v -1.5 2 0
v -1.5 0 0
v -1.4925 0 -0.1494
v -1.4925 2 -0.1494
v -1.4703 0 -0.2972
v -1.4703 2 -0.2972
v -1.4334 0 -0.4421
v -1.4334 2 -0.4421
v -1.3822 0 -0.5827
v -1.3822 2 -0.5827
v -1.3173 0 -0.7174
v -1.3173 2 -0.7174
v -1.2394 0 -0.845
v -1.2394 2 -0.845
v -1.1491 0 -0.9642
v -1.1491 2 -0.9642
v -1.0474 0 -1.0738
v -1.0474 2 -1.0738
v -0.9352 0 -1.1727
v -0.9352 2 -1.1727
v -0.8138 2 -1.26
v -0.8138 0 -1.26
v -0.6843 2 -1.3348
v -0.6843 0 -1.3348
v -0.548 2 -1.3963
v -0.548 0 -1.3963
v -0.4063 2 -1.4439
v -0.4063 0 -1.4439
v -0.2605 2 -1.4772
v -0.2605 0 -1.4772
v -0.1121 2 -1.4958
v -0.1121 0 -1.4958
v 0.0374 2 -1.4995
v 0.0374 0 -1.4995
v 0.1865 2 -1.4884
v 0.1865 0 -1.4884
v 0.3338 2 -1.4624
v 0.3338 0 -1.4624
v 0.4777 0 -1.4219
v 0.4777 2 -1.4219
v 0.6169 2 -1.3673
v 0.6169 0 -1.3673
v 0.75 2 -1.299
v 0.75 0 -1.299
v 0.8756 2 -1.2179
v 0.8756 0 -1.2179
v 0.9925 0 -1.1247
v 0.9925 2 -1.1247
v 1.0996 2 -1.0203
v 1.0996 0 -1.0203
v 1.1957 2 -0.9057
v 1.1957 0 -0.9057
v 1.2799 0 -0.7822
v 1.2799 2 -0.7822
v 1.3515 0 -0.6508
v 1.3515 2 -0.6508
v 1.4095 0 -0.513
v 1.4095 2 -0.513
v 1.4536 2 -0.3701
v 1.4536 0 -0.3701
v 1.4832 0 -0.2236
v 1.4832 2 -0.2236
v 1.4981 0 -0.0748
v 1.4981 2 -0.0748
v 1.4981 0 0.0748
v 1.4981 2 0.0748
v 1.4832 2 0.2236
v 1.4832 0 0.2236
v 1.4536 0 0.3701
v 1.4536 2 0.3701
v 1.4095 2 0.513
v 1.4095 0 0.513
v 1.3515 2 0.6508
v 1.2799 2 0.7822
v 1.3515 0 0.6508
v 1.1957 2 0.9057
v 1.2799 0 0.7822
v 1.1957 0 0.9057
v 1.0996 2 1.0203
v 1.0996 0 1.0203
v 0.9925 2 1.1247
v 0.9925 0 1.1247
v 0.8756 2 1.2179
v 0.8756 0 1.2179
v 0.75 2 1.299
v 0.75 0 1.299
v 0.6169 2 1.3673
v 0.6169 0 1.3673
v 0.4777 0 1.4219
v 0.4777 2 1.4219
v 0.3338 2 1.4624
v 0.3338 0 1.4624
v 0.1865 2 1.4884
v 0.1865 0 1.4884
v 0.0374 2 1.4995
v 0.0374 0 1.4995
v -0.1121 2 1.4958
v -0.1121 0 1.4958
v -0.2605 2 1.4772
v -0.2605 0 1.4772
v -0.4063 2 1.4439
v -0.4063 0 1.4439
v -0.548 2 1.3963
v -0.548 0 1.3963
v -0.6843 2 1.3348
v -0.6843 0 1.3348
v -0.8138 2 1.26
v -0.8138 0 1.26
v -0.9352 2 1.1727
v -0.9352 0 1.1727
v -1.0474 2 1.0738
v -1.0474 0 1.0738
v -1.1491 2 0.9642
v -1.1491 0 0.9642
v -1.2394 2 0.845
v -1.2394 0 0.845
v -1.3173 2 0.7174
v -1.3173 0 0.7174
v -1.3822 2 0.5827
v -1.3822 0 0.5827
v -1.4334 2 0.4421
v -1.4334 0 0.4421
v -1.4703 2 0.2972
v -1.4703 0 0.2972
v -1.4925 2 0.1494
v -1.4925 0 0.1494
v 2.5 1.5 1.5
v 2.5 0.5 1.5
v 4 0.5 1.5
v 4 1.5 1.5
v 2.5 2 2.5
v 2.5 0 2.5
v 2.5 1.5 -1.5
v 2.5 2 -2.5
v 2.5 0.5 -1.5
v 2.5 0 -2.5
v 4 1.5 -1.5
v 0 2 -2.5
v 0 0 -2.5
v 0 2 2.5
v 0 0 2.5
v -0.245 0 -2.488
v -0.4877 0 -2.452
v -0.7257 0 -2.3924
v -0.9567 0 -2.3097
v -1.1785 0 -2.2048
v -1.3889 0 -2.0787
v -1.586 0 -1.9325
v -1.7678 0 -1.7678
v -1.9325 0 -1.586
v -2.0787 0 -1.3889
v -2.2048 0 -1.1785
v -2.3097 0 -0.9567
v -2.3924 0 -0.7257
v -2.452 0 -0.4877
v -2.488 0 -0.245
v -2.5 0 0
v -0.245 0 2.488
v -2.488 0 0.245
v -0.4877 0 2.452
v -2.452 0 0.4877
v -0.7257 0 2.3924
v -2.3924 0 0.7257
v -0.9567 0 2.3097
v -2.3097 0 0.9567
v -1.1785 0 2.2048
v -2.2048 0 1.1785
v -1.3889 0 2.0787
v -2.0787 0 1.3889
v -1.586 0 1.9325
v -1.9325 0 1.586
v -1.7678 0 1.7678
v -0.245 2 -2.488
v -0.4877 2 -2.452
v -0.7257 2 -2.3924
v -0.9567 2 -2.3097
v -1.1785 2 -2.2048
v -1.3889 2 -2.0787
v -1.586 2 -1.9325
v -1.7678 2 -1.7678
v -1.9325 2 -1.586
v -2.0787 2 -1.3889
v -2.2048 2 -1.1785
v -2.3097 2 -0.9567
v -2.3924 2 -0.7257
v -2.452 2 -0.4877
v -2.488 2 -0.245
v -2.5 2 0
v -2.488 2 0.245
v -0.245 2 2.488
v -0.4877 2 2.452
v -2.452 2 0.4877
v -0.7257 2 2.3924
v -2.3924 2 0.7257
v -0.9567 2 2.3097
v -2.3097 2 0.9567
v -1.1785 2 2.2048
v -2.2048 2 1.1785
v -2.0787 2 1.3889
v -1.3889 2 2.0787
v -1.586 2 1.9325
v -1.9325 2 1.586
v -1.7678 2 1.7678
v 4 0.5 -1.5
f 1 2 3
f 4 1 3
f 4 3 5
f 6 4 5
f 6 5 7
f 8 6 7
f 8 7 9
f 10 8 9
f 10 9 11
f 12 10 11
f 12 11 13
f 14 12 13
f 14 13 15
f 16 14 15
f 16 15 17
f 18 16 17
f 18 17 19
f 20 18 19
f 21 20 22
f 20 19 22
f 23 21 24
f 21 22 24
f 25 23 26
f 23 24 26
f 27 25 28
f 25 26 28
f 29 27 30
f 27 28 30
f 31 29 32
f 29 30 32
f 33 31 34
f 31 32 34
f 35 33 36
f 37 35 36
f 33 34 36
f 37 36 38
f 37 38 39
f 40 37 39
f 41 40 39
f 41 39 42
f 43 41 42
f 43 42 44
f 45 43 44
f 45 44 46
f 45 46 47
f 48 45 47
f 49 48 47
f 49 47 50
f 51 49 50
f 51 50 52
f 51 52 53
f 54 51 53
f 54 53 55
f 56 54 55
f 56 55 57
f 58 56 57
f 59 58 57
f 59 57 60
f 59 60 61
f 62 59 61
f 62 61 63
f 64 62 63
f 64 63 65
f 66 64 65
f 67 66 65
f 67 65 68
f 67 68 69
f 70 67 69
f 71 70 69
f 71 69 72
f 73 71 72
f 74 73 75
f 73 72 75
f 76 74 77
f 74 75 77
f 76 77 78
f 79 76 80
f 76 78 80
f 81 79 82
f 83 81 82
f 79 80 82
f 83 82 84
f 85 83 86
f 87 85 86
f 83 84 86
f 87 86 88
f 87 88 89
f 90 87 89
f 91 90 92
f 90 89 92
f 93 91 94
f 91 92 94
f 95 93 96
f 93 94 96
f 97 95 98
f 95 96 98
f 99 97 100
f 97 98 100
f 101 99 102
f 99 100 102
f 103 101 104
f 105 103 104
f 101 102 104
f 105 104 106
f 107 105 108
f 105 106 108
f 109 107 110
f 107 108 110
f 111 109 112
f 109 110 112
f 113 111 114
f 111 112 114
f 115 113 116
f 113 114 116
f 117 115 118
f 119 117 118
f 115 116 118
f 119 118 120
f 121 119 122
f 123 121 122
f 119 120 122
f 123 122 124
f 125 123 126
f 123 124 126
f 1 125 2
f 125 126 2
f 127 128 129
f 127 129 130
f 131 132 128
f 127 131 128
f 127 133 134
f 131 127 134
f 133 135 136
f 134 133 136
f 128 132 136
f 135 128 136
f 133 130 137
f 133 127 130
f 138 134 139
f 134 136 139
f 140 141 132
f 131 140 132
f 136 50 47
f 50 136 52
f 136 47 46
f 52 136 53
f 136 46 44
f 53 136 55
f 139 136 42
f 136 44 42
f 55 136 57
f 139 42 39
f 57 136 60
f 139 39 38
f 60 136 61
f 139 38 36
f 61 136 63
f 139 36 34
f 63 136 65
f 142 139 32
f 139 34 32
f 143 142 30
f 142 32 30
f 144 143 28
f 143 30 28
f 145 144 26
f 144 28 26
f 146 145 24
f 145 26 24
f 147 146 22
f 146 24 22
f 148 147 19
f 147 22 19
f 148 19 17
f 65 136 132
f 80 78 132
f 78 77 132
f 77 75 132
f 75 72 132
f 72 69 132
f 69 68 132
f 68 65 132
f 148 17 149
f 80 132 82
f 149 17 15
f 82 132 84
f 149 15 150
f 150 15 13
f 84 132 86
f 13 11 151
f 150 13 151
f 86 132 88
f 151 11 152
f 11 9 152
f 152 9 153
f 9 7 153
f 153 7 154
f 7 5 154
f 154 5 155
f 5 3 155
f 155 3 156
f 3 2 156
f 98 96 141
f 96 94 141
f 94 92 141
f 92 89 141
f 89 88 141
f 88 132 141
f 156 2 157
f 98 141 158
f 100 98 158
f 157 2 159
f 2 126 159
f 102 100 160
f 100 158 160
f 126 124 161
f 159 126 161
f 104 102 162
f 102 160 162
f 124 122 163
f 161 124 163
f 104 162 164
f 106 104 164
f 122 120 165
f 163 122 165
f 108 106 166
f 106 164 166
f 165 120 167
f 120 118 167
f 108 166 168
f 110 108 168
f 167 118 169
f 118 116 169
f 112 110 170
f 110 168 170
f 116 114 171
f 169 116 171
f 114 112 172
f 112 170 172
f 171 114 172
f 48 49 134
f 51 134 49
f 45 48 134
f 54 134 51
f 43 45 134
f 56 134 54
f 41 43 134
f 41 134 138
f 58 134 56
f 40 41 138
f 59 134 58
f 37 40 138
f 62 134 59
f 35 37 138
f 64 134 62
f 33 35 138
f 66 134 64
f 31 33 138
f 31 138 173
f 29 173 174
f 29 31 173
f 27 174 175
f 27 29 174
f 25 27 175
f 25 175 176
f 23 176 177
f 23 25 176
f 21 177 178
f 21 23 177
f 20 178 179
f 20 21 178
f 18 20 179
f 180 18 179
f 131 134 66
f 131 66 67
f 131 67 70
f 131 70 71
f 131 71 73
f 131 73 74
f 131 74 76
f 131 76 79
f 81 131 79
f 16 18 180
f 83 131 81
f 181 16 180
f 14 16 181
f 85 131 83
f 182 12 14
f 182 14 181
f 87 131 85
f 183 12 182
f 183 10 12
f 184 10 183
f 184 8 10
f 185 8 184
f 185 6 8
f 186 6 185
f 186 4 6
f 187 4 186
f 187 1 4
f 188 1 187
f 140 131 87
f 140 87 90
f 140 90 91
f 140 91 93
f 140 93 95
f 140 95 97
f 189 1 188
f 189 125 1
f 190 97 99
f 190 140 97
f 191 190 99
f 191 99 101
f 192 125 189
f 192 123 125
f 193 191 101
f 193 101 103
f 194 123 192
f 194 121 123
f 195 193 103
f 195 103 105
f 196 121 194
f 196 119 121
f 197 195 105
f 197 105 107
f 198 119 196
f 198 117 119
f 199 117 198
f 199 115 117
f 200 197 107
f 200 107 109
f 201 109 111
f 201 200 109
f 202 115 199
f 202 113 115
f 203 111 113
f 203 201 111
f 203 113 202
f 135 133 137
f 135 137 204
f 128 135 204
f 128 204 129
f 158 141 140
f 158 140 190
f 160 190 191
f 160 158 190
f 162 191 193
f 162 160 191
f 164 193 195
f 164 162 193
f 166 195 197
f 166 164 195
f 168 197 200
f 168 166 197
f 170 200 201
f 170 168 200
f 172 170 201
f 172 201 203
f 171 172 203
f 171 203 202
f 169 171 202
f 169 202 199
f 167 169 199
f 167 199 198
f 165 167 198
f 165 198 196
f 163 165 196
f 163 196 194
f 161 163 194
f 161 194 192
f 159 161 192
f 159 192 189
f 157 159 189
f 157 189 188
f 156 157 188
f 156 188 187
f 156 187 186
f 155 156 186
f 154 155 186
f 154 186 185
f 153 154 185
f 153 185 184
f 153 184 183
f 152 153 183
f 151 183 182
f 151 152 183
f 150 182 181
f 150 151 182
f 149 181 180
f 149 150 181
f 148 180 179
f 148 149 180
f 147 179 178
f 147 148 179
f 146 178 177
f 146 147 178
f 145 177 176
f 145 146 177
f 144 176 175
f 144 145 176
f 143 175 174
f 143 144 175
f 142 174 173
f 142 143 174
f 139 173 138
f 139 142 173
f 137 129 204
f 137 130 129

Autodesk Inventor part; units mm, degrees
ref_plane "YZ Plane" through (0, 0, 0) normal (1, 0, 0) x (0, 1, 0)
ref_plane "XZ Plane" through (0, 0, 0) normal (0, 1, 0) x (-1, 0, 0)
ref_plane "XY Plane" through (0, 0, 0) normal (0, 0, 1) x (1, 0, 0)
sketch "Sketch1" plane through (0, 0, 0) normal (0, 1, 0) x (-1, 0, 0)
  circle A0 centre (0, 0) radius 1.5
  circle A1 centre (0, 0) radius 2.5
  line L0 (0, 0) -> (2.5, 0)
  line L1 (0, 0.75) -> (2.5, 0.75)
  line L2 (0, -0.75) -> (2.5, -0.75)
  line L3 (0, 2.5) -> (-2.5, 2.5)
  line L4 (-2.5, 2.5) -> (-2.5, -2.5)
  line L5 (-2.5, -2.5) -> (0, -2.5)
  line L6 (0, -2.5) -> (0, 2.5)
  point P0 (1.299, 0.75)
  point P1 (2.3848, 0.75)
  point P2 (2.3848, -0.75)
  point P3 (1.299, -0.75)
  dimension "d0" = 3
  dimension "d1" = 5
  dimension "d2" = 0.75
  dimension "d3" = 0.75
extrude "Extrusion1" add sketch "Sketch1" along normal blind 2 contours L0 A1 L2 A0 | A0 L1 A1 L0 | A0 L6 A1 L1 | L2 A1 L6 A0 | A0 L6 A1 | A1 L4 L3 | L5 L4 A1
sketch "Sketch2" plane through (2.5, 0, 2.5) normal (1, 0, 0) x (0, 0, -1)
  line L0 (1, 1.5) -> (4, 1.5)
  line L1 (4, 1.5) -> (4, 0.5)
  line L2 (4, 0.5) -> (1, 0.5)
  line L3 (1, 0.5) -> (1, 1.5)
  line L4 (0, 0) -> (5, 0) projected
  line L5 (5, 0) -> (5, 2) projected
  point P0 (2.5, 0)
  dimension "d6" = 3
  dimension "d7" = 1
  dimension "d8" = 0.5
  dimension "d9" = 1
extrude "Extrusion2" add sketch "Sketch2" along normal blind 1.5
properties part number "AlignmentGateClosed"
